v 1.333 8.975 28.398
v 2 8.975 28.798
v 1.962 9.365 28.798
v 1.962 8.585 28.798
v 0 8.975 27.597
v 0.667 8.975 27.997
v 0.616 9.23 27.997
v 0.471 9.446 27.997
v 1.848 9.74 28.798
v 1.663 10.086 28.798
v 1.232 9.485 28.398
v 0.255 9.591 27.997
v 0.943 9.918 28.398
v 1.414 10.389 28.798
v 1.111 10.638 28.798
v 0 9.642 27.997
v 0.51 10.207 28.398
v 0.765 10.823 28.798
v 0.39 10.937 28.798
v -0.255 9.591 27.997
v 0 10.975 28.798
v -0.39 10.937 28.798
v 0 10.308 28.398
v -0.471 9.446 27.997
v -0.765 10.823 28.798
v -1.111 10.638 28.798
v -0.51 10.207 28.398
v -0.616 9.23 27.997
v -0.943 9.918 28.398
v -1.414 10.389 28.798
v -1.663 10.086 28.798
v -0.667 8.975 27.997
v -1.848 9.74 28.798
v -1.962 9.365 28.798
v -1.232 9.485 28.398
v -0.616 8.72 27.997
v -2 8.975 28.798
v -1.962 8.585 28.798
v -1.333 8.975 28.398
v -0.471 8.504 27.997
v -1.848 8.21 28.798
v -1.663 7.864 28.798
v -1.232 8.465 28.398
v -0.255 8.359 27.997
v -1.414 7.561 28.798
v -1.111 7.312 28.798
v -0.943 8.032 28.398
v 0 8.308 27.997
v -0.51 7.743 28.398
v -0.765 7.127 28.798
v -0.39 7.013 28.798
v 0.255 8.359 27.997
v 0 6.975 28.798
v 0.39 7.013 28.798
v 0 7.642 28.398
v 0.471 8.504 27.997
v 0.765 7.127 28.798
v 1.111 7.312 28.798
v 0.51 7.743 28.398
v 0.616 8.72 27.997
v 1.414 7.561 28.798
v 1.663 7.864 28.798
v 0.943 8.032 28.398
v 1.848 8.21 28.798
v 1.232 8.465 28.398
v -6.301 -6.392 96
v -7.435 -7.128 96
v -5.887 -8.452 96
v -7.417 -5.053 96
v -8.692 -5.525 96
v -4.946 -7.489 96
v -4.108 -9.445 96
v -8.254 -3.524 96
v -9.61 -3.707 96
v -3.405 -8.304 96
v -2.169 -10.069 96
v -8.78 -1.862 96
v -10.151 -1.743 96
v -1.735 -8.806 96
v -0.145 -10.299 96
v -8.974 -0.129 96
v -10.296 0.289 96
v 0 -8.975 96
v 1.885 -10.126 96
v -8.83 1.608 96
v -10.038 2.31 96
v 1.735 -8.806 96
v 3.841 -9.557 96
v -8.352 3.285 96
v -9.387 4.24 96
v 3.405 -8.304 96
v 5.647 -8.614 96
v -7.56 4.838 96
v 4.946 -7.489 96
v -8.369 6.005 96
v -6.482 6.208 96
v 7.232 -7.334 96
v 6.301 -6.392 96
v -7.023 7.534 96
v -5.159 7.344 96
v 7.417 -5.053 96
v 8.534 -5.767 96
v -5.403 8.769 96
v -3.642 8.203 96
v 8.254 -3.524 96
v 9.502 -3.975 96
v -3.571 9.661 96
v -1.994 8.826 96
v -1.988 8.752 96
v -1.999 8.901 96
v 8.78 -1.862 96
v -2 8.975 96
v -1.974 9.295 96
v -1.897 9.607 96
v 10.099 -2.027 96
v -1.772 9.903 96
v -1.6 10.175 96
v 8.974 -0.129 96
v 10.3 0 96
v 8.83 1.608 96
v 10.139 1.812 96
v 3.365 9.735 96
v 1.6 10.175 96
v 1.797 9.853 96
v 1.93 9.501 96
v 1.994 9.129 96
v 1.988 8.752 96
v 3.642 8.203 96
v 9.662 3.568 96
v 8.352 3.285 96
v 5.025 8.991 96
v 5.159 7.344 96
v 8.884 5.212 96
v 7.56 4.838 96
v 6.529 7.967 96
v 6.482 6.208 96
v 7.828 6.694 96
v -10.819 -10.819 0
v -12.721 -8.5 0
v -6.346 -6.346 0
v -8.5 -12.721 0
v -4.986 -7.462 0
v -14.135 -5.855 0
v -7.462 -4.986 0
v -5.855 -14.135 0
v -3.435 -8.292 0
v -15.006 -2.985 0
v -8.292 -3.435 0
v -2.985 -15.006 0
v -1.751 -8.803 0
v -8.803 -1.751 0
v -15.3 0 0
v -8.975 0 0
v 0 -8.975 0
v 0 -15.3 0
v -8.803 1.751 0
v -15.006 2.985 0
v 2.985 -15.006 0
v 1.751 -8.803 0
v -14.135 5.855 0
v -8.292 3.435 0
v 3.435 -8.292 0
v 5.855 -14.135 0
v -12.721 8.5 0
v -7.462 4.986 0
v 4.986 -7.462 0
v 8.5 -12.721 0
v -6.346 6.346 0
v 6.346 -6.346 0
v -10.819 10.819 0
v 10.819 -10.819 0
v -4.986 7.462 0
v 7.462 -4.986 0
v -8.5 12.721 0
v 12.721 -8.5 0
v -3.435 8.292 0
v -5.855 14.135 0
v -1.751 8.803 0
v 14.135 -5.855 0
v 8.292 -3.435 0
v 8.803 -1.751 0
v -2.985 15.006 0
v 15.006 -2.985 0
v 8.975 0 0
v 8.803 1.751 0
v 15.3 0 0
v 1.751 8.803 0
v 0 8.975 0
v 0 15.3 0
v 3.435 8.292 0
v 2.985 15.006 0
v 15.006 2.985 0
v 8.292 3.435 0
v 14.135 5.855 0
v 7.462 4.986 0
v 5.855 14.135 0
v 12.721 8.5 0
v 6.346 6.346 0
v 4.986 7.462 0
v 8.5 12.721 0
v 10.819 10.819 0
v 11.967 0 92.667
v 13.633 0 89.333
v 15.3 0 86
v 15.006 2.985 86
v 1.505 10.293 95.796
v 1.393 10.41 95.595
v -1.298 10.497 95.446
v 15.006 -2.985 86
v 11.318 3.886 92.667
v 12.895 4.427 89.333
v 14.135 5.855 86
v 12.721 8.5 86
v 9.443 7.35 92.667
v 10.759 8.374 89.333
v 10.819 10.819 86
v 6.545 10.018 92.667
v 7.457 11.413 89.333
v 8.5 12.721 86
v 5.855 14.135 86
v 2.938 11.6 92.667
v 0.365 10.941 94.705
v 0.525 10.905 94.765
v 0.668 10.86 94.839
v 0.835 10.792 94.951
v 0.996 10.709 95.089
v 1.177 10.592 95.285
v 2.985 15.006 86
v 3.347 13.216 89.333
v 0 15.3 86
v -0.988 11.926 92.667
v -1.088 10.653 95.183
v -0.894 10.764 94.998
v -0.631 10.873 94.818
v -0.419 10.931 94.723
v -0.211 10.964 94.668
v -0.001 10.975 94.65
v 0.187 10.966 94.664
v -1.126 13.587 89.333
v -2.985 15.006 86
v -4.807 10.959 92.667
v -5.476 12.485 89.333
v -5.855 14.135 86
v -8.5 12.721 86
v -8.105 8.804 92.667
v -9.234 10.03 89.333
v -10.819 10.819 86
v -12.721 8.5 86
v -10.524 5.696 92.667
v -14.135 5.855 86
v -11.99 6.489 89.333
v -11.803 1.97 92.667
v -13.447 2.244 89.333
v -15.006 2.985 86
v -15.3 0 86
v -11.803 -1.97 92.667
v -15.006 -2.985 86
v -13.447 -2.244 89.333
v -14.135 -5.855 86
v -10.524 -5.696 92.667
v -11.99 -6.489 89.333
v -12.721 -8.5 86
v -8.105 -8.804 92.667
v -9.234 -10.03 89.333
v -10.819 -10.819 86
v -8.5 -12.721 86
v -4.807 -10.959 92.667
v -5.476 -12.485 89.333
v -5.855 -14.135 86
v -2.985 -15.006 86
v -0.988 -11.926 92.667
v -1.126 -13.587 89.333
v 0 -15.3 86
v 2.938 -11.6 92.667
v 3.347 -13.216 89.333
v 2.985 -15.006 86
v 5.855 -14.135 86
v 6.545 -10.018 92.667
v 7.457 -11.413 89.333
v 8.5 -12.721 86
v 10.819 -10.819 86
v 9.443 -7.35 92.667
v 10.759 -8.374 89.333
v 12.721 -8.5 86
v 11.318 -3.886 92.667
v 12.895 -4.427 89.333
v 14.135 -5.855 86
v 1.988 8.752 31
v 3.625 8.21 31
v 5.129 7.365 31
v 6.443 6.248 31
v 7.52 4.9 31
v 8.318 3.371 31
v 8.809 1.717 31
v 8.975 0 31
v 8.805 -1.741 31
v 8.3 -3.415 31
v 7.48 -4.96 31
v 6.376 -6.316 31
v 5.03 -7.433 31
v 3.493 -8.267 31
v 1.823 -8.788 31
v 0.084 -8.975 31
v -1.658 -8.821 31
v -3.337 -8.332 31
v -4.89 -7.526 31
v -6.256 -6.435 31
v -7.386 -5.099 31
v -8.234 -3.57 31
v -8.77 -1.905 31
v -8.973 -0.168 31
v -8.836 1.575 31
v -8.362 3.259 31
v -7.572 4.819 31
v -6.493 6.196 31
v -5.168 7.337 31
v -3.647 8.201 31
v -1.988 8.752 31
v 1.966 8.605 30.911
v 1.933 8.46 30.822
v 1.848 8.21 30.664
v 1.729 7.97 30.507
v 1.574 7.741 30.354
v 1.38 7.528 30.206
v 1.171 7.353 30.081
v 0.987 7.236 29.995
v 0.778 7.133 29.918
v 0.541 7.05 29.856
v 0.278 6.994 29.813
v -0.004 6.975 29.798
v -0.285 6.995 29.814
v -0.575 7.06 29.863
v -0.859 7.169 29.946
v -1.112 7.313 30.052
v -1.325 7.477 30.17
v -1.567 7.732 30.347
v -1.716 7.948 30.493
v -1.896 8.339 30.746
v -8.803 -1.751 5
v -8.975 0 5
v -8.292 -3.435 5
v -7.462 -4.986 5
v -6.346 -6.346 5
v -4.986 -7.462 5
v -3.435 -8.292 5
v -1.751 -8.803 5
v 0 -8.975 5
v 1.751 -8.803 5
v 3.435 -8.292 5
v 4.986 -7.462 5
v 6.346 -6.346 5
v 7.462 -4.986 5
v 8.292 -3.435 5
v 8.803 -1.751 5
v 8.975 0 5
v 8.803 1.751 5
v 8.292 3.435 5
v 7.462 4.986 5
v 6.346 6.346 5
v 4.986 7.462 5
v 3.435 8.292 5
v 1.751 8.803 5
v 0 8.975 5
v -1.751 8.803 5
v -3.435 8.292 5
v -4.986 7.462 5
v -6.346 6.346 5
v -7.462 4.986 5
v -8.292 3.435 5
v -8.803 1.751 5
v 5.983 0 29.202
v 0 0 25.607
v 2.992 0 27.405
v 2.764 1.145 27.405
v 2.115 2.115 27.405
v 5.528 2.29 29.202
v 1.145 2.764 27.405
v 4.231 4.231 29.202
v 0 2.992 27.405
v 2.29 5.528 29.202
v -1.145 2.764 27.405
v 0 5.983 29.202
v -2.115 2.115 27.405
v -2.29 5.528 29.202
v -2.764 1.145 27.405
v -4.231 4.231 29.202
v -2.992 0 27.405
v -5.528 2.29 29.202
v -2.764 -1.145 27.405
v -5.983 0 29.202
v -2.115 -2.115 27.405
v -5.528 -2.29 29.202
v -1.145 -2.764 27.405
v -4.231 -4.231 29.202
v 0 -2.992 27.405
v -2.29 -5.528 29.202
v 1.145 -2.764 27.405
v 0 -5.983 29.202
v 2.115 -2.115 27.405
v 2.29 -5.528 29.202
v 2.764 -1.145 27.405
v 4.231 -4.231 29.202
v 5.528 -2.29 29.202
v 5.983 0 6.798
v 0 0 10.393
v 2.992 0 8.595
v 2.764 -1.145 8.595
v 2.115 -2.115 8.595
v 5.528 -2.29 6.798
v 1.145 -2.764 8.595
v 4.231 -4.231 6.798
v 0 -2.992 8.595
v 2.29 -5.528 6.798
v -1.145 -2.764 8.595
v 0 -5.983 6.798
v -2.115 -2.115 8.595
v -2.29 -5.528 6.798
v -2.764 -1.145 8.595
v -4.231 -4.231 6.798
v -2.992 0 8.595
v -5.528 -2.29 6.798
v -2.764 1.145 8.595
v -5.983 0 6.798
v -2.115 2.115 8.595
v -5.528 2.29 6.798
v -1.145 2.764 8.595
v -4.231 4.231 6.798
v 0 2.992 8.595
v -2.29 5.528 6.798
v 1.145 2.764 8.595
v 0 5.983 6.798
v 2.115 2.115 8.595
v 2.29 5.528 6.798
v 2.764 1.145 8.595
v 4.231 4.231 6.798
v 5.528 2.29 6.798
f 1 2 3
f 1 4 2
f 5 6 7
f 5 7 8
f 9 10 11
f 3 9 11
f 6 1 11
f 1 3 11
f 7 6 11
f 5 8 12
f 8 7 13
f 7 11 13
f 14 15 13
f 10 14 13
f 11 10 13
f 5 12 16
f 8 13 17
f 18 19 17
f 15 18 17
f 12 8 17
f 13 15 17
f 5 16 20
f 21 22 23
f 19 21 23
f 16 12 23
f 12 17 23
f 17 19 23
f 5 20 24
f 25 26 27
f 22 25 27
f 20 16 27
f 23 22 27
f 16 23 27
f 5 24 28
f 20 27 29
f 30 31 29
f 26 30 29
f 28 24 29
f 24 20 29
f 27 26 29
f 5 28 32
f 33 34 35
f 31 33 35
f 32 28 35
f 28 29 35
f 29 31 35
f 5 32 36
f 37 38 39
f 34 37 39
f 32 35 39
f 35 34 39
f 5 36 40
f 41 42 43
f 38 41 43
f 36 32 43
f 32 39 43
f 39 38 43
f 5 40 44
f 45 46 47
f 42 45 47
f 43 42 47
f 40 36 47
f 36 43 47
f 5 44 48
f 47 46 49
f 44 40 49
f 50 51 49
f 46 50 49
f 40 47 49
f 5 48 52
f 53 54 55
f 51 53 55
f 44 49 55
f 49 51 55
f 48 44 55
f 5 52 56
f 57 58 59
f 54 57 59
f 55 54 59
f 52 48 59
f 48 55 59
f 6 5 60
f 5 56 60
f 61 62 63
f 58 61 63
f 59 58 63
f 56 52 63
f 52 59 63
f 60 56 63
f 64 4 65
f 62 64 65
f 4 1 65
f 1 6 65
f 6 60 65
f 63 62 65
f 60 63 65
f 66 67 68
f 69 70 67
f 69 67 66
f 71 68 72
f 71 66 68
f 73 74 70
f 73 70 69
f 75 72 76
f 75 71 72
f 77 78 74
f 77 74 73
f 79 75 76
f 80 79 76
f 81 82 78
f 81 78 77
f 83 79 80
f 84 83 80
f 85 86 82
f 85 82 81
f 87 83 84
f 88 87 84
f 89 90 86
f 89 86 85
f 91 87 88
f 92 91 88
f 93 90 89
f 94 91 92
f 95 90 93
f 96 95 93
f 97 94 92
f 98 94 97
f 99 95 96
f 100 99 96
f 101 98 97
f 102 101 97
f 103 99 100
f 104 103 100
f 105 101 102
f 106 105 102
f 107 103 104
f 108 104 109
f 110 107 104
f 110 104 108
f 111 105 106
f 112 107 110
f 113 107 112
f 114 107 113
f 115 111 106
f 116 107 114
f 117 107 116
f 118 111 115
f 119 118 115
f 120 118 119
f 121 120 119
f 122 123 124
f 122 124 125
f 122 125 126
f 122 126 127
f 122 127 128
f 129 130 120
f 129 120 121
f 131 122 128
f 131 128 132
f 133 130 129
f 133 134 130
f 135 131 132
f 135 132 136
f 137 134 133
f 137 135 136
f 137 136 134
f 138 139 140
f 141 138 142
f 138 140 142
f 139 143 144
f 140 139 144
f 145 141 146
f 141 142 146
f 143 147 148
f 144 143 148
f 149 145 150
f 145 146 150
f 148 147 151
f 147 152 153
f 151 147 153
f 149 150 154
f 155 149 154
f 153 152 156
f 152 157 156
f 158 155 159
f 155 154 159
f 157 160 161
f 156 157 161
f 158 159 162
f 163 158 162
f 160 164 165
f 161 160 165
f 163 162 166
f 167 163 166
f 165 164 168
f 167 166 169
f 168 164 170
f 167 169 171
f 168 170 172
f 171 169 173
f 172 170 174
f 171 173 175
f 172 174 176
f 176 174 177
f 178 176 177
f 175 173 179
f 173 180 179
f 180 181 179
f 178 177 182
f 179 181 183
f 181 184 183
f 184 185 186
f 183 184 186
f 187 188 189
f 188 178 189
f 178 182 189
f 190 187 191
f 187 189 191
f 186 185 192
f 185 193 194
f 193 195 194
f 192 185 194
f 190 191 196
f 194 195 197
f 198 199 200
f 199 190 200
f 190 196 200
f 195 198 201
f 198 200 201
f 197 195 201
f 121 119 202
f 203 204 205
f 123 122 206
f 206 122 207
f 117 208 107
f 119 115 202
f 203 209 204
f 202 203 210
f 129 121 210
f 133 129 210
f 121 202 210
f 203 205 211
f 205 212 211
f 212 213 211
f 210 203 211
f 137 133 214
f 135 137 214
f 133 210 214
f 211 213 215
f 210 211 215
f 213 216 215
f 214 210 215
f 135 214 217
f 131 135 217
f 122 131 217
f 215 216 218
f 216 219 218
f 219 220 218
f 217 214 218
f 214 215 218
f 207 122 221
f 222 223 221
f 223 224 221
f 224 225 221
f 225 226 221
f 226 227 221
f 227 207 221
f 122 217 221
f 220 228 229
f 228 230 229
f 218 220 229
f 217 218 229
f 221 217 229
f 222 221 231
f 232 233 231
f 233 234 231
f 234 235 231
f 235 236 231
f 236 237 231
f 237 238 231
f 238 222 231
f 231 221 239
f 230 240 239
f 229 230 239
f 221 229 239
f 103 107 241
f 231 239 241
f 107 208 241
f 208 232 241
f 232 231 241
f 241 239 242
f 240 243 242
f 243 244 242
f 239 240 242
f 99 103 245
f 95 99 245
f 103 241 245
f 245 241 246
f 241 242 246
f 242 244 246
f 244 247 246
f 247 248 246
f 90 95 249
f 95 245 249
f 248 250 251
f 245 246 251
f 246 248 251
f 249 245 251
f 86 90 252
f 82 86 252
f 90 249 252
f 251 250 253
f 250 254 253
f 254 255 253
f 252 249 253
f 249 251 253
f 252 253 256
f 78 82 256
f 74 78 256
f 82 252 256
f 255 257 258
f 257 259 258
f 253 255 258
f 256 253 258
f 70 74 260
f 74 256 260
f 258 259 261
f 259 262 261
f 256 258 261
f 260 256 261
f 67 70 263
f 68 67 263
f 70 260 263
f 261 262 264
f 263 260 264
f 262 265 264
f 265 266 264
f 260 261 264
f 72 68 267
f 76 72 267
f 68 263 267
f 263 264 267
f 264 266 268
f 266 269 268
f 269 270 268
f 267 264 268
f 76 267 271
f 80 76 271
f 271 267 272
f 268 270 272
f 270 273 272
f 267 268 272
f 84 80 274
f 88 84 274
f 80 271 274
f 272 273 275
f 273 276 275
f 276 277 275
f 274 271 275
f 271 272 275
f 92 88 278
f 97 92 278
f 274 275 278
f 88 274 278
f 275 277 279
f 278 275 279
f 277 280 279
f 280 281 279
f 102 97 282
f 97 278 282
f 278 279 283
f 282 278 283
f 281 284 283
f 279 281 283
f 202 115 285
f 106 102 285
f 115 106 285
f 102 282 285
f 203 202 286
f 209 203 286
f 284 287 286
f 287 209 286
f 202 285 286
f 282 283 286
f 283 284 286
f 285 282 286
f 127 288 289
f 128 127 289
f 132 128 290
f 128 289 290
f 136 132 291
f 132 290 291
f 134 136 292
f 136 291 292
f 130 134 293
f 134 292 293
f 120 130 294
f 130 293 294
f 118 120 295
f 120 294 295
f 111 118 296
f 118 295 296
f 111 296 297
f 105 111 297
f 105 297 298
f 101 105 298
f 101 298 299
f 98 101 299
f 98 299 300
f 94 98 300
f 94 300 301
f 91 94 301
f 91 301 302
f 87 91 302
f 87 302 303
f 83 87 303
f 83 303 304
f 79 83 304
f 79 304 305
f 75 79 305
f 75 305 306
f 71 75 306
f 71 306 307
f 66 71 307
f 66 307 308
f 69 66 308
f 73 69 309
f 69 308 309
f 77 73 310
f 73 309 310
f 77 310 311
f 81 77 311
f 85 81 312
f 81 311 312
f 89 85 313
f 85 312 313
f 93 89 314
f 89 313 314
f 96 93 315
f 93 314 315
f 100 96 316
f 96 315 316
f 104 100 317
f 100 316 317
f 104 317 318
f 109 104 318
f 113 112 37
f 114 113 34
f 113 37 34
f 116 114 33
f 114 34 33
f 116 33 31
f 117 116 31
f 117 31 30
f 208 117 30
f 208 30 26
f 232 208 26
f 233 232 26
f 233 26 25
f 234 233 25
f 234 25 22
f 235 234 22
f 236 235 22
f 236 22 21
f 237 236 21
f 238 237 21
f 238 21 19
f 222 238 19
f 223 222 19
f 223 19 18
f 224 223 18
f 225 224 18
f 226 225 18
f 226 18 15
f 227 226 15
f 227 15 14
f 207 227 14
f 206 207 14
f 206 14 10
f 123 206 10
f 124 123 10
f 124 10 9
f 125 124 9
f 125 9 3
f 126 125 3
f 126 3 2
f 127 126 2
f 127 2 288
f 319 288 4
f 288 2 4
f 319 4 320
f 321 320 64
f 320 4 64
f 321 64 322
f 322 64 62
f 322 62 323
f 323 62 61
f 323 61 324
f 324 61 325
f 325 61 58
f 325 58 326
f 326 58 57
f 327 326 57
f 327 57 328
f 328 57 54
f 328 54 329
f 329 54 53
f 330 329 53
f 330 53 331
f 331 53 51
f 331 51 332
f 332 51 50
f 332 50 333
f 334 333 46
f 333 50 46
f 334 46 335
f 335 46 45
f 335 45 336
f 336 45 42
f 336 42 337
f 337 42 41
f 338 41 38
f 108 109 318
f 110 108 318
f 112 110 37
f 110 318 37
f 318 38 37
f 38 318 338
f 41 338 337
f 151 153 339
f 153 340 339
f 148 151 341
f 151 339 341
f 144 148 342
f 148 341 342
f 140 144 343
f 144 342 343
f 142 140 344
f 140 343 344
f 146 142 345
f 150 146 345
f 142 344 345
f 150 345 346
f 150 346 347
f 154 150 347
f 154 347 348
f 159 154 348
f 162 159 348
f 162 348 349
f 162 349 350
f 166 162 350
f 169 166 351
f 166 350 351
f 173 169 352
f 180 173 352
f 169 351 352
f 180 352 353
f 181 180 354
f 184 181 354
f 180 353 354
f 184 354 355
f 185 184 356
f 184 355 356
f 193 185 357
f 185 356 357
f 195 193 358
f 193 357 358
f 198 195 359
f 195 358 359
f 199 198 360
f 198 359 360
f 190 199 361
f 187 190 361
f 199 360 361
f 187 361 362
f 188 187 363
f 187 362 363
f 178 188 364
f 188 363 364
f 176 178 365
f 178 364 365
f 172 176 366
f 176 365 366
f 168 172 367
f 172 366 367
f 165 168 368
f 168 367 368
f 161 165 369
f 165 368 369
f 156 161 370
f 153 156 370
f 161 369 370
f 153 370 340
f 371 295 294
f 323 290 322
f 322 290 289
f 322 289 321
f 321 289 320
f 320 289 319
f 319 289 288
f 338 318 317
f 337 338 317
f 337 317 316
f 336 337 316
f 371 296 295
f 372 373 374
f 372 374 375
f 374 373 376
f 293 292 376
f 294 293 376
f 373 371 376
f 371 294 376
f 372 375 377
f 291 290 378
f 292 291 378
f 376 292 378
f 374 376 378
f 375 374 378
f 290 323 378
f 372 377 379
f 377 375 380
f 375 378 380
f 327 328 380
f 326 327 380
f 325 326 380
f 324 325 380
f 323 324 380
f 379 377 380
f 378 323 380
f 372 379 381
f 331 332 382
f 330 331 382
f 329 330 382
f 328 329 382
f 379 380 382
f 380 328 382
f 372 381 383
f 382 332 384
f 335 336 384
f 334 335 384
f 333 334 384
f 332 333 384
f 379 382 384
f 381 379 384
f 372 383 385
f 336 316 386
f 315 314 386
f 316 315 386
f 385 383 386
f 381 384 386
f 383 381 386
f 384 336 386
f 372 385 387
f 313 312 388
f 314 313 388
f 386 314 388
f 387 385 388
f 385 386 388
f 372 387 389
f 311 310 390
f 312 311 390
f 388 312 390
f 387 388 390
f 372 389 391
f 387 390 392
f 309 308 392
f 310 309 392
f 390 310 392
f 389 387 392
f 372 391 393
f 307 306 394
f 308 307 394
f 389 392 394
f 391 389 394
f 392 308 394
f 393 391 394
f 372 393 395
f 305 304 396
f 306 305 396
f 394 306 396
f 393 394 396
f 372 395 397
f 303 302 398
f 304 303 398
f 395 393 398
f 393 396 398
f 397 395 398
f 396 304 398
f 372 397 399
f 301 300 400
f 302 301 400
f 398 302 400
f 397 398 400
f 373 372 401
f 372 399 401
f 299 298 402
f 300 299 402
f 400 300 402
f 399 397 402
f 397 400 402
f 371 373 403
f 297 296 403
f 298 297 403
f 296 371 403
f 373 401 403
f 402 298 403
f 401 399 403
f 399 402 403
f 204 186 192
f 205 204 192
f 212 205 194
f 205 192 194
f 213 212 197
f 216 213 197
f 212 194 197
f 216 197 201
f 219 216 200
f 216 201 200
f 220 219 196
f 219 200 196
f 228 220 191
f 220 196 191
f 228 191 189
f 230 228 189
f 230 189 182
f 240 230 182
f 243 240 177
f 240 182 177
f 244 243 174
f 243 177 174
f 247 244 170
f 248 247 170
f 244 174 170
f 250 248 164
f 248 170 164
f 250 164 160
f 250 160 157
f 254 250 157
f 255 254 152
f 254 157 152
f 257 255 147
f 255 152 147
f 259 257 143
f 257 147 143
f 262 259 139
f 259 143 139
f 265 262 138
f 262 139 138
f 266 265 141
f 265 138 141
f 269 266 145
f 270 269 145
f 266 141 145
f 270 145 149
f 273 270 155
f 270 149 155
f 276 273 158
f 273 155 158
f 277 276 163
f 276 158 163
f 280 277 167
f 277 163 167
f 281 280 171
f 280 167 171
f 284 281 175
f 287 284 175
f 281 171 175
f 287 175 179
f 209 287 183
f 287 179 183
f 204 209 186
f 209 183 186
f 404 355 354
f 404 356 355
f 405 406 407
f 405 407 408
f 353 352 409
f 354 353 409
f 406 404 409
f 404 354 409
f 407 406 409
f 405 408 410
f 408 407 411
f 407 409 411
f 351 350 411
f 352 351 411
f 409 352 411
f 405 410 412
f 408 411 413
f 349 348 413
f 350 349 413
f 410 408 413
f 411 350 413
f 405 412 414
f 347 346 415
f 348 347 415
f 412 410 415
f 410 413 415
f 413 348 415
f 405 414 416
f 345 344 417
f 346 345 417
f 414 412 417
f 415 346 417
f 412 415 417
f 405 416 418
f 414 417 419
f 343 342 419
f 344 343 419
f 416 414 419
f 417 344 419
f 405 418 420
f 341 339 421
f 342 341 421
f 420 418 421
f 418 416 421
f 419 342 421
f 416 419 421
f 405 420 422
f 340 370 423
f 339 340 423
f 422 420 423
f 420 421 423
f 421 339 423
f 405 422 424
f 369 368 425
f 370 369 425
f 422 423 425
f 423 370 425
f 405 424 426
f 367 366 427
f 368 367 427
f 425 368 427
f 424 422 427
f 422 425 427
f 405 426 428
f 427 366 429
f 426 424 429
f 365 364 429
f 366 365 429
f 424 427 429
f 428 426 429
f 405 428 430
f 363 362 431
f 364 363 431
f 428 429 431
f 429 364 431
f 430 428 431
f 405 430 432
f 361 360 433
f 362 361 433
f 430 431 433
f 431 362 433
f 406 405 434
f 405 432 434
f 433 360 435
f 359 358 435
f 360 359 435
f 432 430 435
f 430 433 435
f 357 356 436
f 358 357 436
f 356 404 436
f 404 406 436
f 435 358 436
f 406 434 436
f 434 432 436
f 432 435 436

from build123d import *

# Parameters (mm, degrees)
F0_R     = 15.3
F1_DEPTH = 96
F3_D     = 17.95
F3_DEPTH = 65
F3_TIP   = 5.3927240558
F4_SIZE2 = 10
F4_SIZE  = 5
F6_D     = 4
F6_DEPTH = 1
F6_START = 66.2017213
F6_TIP   = 1.2017212381
F8_D     = 17.95
F8_DEPTH = 5
F8_TIP   = 5.3927240558


with BuildPart() as f1:
    # F0 (on Top) → F1 (new body)
    with BuildSketch(Plane.XY):
        Circle(F0_R)
    extrude(amount=F1_DEPTH)

    # F3
    with Locations(Plane.XY.offset(96)):
        with Locations((0, 0)):
            Hole(F3_D / 2, depth=F3_DEPTH)
            with Locations((0, 0, -(F3_DEPTH + F3_TIP / 2))):  # 118° drill point
                Cone(0, F3_D / 2, F3_TIP, mode=Mode.SUBTRACT)

    # F4
    f4_edges = [f1.edges().sort_by_distance(p)[0] for p in [
        (-15.3, 0, 96),
    ]]
    f4_side = f1.faces().sort_by_distance((-14.867251, 0, 96))[0]
    chamfer(f4_edges, length=F4_SIZE, length2=F4_SIZE2, reference=f4_side)

    # F6
    # its depths count from where the whole tool has entered the part; down to there all is cleared
    with Locations(Plane.XY.offset(96)):
        with Locations((0, 8.975)):
            Hole(F6_D / 2, depth=F6_START)
    with Locations(Plane.XY.offset(96).offset(-F6_START)):
        with Locations((0, 8.975)):
            Hole(F6_D / 2, depth=F6_DEPTH)
            with Locations((0, 0, -(F6_DEPTH + F6_TIP / 2))):  # 118° drill point
                Cone(0, F6_D / 2, F6_TIP, mode=Mode.SUBTRACT)

    # F8
    with Locations(Plane(origin=(0, 0, 0), x_dir=(1, 0, 0), z_dir=(0, 0, -1))):
        with Locations((0, 0)):
            Hole(F8_D / 2, depth=F8_DEPTH)
            with Locations((0, 0, -(F8_DEPTH + F8_TIP / 2))):  # 118° drill point
                Cone(0, F8_D / 2, F8_TIP, mode=Mode.SUBTRACT)


solid = f1.part
